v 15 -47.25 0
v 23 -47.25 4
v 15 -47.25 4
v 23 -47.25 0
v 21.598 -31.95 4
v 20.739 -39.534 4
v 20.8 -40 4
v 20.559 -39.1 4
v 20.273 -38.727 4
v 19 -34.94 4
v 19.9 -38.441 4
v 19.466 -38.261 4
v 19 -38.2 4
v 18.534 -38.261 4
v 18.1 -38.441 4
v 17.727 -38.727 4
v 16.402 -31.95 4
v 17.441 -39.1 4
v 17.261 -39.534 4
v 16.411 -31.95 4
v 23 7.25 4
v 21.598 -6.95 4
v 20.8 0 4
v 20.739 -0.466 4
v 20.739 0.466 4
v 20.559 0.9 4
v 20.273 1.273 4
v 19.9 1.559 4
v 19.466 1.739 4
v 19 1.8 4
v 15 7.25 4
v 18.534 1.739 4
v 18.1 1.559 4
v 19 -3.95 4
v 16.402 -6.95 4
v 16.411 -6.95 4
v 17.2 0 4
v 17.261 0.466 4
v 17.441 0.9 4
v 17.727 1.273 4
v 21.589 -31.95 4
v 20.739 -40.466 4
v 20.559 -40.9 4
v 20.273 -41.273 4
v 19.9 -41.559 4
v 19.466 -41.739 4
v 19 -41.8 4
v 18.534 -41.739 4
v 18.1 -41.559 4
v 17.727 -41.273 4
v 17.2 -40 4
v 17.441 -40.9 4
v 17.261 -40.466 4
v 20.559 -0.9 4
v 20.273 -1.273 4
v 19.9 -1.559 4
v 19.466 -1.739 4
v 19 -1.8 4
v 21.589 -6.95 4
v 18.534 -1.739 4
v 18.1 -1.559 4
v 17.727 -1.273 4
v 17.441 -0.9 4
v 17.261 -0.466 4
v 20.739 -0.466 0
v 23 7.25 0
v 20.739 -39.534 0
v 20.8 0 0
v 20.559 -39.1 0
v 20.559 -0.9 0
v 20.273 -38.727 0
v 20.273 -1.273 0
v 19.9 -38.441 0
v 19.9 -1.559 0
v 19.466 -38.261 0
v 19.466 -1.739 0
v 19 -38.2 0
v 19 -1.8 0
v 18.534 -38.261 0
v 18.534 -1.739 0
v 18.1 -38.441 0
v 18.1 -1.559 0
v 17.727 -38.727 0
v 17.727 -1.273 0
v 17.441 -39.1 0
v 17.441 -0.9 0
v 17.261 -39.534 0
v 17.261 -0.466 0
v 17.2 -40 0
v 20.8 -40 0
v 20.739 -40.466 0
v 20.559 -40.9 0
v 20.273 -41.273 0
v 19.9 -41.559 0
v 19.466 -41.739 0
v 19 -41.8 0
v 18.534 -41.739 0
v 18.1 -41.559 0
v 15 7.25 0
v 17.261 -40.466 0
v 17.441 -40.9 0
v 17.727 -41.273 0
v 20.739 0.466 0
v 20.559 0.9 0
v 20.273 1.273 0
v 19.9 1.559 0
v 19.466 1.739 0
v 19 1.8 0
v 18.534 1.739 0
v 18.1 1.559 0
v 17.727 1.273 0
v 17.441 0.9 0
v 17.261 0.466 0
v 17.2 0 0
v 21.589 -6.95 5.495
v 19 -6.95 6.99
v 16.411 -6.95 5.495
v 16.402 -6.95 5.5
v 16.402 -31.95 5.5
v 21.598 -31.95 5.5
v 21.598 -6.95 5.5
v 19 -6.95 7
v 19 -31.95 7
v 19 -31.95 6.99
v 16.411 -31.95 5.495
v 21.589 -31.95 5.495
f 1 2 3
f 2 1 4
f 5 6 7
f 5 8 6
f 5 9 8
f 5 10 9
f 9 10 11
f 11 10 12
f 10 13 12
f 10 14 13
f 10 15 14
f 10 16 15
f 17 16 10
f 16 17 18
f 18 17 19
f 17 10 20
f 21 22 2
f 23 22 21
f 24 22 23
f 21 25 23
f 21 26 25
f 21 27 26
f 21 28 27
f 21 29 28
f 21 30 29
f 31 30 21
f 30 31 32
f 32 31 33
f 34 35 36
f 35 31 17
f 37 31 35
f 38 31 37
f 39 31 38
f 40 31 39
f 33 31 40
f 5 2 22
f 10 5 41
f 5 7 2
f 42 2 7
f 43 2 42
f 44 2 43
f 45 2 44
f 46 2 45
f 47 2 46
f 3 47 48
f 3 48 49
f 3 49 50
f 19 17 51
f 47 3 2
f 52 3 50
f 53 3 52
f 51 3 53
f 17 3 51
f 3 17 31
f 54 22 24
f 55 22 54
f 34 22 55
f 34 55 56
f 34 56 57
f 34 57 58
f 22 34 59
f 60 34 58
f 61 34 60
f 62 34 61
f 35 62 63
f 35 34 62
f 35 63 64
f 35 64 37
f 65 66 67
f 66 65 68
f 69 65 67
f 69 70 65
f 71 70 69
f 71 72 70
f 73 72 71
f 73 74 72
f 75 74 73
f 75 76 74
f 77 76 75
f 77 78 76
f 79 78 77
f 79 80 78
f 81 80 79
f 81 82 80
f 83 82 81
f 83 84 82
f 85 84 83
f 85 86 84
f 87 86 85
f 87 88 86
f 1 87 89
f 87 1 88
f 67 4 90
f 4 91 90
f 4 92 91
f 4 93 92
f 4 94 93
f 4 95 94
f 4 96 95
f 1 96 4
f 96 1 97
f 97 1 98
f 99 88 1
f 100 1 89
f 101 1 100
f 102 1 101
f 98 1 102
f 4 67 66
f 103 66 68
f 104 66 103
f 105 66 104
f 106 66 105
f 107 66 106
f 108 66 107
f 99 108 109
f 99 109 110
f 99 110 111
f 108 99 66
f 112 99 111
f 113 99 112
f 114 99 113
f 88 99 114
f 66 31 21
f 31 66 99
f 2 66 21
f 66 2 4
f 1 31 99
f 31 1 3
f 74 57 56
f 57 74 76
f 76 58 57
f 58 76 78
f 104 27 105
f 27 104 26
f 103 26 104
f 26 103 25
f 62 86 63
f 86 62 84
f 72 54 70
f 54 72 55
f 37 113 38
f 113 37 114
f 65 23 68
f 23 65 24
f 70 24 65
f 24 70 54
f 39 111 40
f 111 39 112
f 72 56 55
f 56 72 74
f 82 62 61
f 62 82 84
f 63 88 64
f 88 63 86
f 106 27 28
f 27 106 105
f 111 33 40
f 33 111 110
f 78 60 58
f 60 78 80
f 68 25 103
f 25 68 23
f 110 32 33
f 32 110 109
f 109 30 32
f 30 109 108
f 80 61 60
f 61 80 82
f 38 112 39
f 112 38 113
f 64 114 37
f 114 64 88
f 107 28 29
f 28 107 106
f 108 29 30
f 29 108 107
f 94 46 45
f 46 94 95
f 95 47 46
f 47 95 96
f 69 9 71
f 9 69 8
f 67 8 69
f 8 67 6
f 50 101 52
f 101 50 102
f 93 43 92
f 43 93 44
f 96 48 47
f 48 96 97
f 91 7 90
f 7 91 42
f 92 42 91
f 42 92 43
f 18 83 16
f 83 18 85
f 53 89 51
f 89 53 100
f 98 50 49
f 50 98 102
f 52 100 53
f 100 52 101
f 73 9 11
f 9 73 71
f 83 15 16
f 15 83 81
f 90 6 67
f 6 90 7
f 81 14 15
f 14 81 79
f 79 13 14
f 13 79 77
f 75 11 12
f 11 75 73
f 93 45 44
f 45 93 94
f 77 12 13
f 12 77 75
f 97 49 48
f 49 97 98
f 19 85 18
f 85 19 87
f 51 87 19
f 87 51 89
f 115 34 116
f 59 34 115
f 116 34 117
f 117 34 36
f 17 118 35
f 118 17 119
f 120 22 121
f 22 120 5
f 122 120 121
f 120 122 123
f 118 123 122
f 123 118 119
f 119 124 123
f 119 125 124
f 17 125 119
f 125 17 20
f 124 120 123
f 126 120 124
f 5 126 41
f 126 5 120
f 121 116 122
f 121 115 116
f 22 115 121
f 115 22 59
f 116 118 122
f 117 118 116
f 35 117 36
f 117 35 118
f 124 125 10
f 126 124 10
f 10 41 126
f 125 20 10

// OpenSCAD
//Vertex Brackets for Version 2 of 3/4" Horizontal EMT
//11/30/2016    By: David Bunch
//
Ht = 8;
HoleID = 3.6;           //Use M3 screws
BoltHdDia = 7.8;
M3Nut = 7;
M3NutHt = 4.6;
Ht2 = Ht / 2;
$fn=24;
module Ver34Bracket()
{
    difference()
    {
        linear_extrude(height = Ht, center = false , convexity = 10)
        import(file = "EMT34_V2_SideHoldingBracket_rev10.dxf", layer = "Ver34Bracket_V2");
        translate([0,-15.15,0])
        Holes();
    }
}
module Holes()
{
    translate([0, 0, Ht2])
    rotate([0,90,0])
    cylinder(d = HoleID, h = 42,center=true);
    translate([-9.52,0,Ht2])
    rotate([0,-90,0])
    cylinder(d = 6, h = 3);         //Countersink M3 socket head by 2mm
}

module Ver34_ExtBracket()
{
    difference()
    {
        linear_extrude(height = Ht, center = false , convexity = 10)
        import(file = "EMT34_V2_SideHoldingBracket_rev10.dxf", layer = "Ver34_ExtBracket_V2");
        translate([0,-15.15,0])
        Holes();
        translate([0,24.85,0])
        Holes();
    }
}
module Dove34_Bracket()
{
    difference()
    {
        linear_extrude(height = Ht, center = false , convexity = 10)
        import(file = "EMT34_V2_SideHoldingBracket_rev10.dxf", layer = "Ver34DoveBracket_V2");
        translate([0,-15.15,0])
        Holes();
    }
}

module Bump()
{
    translate([0,0,-3])
    cylinder(d1=0,d2=6,h=3.01,$fn=6);
    cylinder(d=6,h=25,$fn=6);
    translate([0,0,24.99])
    cylinder(d1=6,d2=0,h=3,$fn=6);
}
module BracketCube()
{
    union()
    {
        difference()
        {
            translate([-7.25,-Ht2,0])
            cube([54.5,Ht,4]);
            translate([0,0,-1])
            cylinder(d=HoleID,h=30,$fn=24);
            translate([40,0,-1])
            cylinder(d=HoleID,h=30,$fn=24);

        }
        translate([6.95,0,Ht/2])
        rotate([0,90,0])
        Bump();
    }
}
translate([19,0,0])
rotate([0,0,-90])
BracketCube();              //Back part of Extended Bracket

Ver34_ExtBracket();         //Front part of Extended Bracket

translate([-8,-30.3,0])
rotate([0,0,180])
Ver34Bracket();             //Main Bracket

translate([-42,0,0])
Dove34_Bracket();           //Bracket to hold pipe to vertex & vertex to Dovetail Frame
